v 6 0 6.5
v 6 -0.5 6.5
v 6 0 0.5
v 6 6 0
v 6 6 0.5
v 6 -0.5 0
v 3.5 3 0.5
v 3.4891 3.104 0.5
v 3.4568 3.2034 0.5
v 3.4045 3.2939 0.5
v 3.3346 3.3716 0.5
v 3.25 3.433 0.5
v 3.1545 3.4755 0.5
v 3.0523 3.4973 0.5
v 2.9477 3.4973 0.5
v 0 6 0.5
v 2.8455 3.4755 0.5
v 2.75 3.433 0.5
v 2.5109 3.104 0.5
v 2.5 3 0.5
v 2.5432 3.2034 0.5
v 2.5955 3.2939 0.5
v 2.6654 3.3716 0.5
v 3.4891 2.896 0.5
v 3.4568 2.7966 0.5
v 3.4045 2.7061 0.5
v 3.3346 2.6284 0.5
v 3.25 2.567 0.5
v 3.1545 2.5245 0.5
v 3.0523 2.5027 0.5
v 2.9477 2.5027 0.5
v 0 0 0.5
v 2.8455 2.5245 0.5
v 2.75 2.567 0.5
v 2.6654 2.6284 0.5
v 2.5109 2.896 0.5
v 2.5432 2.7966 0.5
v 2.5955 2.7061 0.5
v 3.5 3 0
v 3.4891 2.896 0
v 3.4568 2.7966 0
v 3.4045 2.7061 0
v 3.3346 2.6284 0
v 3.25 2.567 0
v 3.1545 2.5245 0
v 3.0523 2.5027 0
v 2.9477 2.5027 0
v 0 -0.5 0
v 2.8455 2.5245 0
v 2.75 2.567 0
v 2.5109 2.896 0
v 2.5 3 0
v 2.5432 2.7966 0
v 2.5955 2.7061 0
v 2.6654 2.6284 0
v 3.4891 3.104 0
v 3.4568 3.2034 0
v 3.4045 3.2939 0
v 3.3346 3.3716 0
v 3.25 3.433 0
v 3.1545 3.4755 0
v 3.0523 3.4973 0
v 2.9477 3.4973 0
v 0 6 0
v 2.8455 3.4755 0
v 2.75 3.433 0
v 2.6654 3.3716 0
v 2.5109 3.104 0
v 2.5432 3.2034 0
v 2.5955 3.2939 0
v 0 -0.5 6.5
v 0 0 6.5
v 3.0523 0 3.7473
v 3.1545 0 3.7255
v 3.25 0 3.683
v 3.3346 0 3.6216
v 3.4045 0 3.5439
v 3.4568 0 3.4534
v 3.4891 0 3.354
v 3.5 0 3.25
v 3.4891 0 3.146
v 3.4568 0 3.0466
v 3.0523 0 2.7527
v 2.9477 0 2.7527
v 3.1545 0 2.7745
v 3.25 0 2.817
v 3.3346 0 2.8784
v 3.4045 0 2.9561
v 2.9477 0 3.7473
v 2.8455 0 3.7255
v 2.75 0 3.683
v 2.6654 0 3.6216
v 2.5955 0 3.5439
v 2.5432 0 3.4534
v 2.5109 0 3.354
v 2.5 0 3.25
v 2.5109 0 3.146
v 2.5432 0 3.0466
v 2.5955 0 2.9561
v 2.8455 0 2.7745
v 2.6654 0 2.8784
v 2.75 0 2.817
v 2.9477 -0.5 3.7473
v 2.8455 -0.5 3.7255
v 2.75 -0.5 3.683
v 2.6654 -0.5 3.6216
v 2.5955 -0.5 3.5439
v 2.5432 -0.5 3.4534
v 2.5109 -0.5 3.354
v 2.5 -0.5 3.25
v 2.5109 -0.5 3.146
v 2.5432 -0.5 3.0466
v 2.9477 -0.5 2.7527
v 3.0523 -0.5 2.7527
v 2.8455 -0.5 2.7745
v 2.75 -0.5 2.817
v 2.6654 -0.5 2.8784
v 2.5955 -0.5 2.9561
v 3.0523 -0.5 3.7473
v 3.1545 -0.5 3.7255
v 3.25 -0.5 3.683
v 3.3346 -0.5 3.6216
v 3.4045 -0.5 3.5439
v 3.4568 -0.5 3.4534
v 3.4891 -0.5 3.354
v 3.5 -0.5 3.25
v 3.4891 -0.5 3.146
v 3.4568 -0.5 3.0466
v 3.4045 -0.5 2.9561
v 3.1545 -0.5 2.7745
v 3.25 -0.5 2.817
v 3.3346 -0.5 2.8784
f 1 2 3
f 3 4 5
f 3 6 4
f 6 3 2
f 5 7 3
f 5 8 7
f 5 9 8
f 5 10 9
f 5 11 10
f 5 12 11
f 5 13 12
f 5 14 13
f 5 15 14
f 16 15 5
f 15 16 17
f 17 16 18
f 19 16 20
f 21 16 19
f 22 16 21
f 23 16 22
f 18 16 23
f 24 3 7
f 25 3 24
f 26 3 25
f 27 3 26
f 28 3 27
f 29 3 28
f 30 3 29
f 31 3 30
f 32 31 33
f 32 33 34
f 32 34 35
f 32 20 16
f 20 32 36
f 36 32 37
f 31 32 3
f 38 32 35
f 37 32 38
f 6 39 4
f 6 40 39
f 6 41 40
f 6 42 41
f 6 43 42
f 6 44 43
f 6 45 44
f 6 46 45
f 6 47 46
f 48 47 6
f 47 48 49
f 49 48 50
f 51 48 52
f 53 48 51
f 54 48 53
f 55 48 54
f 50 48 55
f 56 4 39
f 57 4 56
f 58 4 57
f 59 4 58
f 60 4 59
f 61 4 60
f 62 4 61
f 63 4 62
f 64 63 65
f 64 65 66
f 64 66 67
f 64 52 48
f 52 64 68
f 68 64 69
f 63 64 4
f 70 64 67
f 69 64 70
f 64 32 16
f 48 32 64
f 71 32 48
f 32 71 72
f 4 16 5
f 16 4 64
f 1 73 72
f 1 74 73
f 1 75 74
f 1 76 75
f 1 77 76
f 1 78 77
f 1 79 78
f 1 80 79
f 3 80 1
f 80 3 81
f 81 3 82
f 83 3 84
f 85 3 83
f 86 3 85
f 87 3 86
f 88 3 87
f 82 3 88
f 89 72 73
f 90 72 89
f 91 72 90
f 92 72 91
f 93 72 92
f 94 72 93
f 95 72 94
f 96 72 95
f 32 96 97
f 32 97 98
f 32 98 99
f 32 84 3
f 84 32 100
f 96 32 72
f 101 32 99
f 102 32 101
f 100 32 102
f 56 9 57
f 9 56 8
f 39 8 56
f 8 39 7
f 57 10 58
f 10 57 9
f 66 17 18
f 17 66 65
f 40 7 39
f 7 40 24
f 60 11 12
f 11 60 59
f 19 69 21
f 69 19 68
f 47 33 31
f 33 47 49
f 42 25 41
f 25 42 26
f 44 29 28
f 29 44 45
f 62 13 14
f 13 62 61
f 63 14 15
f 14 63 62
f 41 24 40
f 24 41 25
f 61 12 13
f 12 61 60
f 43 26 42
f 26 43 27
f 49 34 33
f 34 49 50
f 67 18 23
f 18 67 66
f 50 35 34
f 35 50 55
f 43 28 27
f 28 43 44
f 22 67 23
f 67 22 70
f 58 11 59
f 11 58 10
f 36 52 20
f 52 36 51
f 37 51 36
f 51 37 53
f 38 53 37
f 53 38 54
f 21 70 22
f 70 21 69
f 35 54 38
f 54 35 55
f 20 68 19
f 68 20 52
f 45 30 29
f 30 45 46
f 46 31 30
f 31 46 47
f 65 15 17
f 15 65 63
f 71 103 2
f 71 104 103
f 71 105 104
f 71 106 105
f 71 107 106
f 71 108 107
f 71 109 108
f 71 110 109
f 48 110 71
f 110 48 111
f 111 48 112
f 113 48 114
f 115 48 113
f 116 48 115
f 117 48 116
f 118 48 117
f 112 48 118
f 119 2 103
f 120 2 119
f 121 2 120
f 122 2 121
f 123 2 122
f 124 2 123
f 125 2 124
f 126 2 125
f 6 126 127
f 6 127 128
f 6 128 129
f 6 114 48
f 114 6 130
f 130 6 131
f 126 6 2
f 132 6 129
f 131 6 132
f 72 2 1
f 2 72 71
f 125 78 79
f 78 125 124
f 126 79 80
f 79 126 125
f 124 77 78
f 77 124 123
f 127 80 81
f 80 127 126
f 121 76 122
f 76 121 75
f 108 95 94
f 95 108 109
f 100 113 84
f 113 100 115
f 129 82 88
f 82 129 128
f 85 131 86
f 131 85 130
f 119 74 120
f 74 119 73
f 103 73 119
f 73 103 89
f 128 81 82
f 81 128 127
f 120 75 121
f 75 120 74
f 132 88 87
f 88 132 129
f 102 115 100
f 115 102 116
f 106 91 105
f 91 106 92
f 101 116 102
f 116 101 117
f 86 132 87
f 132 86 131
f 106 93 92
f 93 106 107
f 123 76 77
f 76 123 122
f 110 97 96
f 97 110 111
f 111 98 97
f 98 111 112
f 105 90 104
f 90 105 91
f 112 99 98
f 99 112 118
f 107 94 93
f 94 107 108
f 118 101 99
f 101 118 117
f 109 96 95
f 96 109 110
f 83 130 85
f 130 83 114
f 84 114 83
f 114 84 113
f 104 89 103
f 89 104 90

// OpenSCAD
module plate(length, width, height){
	difference(){
		cube([length, width, height]);
		translate([length/2,width/2,0]){
			cylinder(r = 0.5, h =1, $fn = 30);
		}
	}
}

module bracket(w,l,h){
	plate(w,l,h);
	rotate(a = 90, v=[1,0,0]) plate(l,w+h,h);
}
bracket(6,6,.5);
